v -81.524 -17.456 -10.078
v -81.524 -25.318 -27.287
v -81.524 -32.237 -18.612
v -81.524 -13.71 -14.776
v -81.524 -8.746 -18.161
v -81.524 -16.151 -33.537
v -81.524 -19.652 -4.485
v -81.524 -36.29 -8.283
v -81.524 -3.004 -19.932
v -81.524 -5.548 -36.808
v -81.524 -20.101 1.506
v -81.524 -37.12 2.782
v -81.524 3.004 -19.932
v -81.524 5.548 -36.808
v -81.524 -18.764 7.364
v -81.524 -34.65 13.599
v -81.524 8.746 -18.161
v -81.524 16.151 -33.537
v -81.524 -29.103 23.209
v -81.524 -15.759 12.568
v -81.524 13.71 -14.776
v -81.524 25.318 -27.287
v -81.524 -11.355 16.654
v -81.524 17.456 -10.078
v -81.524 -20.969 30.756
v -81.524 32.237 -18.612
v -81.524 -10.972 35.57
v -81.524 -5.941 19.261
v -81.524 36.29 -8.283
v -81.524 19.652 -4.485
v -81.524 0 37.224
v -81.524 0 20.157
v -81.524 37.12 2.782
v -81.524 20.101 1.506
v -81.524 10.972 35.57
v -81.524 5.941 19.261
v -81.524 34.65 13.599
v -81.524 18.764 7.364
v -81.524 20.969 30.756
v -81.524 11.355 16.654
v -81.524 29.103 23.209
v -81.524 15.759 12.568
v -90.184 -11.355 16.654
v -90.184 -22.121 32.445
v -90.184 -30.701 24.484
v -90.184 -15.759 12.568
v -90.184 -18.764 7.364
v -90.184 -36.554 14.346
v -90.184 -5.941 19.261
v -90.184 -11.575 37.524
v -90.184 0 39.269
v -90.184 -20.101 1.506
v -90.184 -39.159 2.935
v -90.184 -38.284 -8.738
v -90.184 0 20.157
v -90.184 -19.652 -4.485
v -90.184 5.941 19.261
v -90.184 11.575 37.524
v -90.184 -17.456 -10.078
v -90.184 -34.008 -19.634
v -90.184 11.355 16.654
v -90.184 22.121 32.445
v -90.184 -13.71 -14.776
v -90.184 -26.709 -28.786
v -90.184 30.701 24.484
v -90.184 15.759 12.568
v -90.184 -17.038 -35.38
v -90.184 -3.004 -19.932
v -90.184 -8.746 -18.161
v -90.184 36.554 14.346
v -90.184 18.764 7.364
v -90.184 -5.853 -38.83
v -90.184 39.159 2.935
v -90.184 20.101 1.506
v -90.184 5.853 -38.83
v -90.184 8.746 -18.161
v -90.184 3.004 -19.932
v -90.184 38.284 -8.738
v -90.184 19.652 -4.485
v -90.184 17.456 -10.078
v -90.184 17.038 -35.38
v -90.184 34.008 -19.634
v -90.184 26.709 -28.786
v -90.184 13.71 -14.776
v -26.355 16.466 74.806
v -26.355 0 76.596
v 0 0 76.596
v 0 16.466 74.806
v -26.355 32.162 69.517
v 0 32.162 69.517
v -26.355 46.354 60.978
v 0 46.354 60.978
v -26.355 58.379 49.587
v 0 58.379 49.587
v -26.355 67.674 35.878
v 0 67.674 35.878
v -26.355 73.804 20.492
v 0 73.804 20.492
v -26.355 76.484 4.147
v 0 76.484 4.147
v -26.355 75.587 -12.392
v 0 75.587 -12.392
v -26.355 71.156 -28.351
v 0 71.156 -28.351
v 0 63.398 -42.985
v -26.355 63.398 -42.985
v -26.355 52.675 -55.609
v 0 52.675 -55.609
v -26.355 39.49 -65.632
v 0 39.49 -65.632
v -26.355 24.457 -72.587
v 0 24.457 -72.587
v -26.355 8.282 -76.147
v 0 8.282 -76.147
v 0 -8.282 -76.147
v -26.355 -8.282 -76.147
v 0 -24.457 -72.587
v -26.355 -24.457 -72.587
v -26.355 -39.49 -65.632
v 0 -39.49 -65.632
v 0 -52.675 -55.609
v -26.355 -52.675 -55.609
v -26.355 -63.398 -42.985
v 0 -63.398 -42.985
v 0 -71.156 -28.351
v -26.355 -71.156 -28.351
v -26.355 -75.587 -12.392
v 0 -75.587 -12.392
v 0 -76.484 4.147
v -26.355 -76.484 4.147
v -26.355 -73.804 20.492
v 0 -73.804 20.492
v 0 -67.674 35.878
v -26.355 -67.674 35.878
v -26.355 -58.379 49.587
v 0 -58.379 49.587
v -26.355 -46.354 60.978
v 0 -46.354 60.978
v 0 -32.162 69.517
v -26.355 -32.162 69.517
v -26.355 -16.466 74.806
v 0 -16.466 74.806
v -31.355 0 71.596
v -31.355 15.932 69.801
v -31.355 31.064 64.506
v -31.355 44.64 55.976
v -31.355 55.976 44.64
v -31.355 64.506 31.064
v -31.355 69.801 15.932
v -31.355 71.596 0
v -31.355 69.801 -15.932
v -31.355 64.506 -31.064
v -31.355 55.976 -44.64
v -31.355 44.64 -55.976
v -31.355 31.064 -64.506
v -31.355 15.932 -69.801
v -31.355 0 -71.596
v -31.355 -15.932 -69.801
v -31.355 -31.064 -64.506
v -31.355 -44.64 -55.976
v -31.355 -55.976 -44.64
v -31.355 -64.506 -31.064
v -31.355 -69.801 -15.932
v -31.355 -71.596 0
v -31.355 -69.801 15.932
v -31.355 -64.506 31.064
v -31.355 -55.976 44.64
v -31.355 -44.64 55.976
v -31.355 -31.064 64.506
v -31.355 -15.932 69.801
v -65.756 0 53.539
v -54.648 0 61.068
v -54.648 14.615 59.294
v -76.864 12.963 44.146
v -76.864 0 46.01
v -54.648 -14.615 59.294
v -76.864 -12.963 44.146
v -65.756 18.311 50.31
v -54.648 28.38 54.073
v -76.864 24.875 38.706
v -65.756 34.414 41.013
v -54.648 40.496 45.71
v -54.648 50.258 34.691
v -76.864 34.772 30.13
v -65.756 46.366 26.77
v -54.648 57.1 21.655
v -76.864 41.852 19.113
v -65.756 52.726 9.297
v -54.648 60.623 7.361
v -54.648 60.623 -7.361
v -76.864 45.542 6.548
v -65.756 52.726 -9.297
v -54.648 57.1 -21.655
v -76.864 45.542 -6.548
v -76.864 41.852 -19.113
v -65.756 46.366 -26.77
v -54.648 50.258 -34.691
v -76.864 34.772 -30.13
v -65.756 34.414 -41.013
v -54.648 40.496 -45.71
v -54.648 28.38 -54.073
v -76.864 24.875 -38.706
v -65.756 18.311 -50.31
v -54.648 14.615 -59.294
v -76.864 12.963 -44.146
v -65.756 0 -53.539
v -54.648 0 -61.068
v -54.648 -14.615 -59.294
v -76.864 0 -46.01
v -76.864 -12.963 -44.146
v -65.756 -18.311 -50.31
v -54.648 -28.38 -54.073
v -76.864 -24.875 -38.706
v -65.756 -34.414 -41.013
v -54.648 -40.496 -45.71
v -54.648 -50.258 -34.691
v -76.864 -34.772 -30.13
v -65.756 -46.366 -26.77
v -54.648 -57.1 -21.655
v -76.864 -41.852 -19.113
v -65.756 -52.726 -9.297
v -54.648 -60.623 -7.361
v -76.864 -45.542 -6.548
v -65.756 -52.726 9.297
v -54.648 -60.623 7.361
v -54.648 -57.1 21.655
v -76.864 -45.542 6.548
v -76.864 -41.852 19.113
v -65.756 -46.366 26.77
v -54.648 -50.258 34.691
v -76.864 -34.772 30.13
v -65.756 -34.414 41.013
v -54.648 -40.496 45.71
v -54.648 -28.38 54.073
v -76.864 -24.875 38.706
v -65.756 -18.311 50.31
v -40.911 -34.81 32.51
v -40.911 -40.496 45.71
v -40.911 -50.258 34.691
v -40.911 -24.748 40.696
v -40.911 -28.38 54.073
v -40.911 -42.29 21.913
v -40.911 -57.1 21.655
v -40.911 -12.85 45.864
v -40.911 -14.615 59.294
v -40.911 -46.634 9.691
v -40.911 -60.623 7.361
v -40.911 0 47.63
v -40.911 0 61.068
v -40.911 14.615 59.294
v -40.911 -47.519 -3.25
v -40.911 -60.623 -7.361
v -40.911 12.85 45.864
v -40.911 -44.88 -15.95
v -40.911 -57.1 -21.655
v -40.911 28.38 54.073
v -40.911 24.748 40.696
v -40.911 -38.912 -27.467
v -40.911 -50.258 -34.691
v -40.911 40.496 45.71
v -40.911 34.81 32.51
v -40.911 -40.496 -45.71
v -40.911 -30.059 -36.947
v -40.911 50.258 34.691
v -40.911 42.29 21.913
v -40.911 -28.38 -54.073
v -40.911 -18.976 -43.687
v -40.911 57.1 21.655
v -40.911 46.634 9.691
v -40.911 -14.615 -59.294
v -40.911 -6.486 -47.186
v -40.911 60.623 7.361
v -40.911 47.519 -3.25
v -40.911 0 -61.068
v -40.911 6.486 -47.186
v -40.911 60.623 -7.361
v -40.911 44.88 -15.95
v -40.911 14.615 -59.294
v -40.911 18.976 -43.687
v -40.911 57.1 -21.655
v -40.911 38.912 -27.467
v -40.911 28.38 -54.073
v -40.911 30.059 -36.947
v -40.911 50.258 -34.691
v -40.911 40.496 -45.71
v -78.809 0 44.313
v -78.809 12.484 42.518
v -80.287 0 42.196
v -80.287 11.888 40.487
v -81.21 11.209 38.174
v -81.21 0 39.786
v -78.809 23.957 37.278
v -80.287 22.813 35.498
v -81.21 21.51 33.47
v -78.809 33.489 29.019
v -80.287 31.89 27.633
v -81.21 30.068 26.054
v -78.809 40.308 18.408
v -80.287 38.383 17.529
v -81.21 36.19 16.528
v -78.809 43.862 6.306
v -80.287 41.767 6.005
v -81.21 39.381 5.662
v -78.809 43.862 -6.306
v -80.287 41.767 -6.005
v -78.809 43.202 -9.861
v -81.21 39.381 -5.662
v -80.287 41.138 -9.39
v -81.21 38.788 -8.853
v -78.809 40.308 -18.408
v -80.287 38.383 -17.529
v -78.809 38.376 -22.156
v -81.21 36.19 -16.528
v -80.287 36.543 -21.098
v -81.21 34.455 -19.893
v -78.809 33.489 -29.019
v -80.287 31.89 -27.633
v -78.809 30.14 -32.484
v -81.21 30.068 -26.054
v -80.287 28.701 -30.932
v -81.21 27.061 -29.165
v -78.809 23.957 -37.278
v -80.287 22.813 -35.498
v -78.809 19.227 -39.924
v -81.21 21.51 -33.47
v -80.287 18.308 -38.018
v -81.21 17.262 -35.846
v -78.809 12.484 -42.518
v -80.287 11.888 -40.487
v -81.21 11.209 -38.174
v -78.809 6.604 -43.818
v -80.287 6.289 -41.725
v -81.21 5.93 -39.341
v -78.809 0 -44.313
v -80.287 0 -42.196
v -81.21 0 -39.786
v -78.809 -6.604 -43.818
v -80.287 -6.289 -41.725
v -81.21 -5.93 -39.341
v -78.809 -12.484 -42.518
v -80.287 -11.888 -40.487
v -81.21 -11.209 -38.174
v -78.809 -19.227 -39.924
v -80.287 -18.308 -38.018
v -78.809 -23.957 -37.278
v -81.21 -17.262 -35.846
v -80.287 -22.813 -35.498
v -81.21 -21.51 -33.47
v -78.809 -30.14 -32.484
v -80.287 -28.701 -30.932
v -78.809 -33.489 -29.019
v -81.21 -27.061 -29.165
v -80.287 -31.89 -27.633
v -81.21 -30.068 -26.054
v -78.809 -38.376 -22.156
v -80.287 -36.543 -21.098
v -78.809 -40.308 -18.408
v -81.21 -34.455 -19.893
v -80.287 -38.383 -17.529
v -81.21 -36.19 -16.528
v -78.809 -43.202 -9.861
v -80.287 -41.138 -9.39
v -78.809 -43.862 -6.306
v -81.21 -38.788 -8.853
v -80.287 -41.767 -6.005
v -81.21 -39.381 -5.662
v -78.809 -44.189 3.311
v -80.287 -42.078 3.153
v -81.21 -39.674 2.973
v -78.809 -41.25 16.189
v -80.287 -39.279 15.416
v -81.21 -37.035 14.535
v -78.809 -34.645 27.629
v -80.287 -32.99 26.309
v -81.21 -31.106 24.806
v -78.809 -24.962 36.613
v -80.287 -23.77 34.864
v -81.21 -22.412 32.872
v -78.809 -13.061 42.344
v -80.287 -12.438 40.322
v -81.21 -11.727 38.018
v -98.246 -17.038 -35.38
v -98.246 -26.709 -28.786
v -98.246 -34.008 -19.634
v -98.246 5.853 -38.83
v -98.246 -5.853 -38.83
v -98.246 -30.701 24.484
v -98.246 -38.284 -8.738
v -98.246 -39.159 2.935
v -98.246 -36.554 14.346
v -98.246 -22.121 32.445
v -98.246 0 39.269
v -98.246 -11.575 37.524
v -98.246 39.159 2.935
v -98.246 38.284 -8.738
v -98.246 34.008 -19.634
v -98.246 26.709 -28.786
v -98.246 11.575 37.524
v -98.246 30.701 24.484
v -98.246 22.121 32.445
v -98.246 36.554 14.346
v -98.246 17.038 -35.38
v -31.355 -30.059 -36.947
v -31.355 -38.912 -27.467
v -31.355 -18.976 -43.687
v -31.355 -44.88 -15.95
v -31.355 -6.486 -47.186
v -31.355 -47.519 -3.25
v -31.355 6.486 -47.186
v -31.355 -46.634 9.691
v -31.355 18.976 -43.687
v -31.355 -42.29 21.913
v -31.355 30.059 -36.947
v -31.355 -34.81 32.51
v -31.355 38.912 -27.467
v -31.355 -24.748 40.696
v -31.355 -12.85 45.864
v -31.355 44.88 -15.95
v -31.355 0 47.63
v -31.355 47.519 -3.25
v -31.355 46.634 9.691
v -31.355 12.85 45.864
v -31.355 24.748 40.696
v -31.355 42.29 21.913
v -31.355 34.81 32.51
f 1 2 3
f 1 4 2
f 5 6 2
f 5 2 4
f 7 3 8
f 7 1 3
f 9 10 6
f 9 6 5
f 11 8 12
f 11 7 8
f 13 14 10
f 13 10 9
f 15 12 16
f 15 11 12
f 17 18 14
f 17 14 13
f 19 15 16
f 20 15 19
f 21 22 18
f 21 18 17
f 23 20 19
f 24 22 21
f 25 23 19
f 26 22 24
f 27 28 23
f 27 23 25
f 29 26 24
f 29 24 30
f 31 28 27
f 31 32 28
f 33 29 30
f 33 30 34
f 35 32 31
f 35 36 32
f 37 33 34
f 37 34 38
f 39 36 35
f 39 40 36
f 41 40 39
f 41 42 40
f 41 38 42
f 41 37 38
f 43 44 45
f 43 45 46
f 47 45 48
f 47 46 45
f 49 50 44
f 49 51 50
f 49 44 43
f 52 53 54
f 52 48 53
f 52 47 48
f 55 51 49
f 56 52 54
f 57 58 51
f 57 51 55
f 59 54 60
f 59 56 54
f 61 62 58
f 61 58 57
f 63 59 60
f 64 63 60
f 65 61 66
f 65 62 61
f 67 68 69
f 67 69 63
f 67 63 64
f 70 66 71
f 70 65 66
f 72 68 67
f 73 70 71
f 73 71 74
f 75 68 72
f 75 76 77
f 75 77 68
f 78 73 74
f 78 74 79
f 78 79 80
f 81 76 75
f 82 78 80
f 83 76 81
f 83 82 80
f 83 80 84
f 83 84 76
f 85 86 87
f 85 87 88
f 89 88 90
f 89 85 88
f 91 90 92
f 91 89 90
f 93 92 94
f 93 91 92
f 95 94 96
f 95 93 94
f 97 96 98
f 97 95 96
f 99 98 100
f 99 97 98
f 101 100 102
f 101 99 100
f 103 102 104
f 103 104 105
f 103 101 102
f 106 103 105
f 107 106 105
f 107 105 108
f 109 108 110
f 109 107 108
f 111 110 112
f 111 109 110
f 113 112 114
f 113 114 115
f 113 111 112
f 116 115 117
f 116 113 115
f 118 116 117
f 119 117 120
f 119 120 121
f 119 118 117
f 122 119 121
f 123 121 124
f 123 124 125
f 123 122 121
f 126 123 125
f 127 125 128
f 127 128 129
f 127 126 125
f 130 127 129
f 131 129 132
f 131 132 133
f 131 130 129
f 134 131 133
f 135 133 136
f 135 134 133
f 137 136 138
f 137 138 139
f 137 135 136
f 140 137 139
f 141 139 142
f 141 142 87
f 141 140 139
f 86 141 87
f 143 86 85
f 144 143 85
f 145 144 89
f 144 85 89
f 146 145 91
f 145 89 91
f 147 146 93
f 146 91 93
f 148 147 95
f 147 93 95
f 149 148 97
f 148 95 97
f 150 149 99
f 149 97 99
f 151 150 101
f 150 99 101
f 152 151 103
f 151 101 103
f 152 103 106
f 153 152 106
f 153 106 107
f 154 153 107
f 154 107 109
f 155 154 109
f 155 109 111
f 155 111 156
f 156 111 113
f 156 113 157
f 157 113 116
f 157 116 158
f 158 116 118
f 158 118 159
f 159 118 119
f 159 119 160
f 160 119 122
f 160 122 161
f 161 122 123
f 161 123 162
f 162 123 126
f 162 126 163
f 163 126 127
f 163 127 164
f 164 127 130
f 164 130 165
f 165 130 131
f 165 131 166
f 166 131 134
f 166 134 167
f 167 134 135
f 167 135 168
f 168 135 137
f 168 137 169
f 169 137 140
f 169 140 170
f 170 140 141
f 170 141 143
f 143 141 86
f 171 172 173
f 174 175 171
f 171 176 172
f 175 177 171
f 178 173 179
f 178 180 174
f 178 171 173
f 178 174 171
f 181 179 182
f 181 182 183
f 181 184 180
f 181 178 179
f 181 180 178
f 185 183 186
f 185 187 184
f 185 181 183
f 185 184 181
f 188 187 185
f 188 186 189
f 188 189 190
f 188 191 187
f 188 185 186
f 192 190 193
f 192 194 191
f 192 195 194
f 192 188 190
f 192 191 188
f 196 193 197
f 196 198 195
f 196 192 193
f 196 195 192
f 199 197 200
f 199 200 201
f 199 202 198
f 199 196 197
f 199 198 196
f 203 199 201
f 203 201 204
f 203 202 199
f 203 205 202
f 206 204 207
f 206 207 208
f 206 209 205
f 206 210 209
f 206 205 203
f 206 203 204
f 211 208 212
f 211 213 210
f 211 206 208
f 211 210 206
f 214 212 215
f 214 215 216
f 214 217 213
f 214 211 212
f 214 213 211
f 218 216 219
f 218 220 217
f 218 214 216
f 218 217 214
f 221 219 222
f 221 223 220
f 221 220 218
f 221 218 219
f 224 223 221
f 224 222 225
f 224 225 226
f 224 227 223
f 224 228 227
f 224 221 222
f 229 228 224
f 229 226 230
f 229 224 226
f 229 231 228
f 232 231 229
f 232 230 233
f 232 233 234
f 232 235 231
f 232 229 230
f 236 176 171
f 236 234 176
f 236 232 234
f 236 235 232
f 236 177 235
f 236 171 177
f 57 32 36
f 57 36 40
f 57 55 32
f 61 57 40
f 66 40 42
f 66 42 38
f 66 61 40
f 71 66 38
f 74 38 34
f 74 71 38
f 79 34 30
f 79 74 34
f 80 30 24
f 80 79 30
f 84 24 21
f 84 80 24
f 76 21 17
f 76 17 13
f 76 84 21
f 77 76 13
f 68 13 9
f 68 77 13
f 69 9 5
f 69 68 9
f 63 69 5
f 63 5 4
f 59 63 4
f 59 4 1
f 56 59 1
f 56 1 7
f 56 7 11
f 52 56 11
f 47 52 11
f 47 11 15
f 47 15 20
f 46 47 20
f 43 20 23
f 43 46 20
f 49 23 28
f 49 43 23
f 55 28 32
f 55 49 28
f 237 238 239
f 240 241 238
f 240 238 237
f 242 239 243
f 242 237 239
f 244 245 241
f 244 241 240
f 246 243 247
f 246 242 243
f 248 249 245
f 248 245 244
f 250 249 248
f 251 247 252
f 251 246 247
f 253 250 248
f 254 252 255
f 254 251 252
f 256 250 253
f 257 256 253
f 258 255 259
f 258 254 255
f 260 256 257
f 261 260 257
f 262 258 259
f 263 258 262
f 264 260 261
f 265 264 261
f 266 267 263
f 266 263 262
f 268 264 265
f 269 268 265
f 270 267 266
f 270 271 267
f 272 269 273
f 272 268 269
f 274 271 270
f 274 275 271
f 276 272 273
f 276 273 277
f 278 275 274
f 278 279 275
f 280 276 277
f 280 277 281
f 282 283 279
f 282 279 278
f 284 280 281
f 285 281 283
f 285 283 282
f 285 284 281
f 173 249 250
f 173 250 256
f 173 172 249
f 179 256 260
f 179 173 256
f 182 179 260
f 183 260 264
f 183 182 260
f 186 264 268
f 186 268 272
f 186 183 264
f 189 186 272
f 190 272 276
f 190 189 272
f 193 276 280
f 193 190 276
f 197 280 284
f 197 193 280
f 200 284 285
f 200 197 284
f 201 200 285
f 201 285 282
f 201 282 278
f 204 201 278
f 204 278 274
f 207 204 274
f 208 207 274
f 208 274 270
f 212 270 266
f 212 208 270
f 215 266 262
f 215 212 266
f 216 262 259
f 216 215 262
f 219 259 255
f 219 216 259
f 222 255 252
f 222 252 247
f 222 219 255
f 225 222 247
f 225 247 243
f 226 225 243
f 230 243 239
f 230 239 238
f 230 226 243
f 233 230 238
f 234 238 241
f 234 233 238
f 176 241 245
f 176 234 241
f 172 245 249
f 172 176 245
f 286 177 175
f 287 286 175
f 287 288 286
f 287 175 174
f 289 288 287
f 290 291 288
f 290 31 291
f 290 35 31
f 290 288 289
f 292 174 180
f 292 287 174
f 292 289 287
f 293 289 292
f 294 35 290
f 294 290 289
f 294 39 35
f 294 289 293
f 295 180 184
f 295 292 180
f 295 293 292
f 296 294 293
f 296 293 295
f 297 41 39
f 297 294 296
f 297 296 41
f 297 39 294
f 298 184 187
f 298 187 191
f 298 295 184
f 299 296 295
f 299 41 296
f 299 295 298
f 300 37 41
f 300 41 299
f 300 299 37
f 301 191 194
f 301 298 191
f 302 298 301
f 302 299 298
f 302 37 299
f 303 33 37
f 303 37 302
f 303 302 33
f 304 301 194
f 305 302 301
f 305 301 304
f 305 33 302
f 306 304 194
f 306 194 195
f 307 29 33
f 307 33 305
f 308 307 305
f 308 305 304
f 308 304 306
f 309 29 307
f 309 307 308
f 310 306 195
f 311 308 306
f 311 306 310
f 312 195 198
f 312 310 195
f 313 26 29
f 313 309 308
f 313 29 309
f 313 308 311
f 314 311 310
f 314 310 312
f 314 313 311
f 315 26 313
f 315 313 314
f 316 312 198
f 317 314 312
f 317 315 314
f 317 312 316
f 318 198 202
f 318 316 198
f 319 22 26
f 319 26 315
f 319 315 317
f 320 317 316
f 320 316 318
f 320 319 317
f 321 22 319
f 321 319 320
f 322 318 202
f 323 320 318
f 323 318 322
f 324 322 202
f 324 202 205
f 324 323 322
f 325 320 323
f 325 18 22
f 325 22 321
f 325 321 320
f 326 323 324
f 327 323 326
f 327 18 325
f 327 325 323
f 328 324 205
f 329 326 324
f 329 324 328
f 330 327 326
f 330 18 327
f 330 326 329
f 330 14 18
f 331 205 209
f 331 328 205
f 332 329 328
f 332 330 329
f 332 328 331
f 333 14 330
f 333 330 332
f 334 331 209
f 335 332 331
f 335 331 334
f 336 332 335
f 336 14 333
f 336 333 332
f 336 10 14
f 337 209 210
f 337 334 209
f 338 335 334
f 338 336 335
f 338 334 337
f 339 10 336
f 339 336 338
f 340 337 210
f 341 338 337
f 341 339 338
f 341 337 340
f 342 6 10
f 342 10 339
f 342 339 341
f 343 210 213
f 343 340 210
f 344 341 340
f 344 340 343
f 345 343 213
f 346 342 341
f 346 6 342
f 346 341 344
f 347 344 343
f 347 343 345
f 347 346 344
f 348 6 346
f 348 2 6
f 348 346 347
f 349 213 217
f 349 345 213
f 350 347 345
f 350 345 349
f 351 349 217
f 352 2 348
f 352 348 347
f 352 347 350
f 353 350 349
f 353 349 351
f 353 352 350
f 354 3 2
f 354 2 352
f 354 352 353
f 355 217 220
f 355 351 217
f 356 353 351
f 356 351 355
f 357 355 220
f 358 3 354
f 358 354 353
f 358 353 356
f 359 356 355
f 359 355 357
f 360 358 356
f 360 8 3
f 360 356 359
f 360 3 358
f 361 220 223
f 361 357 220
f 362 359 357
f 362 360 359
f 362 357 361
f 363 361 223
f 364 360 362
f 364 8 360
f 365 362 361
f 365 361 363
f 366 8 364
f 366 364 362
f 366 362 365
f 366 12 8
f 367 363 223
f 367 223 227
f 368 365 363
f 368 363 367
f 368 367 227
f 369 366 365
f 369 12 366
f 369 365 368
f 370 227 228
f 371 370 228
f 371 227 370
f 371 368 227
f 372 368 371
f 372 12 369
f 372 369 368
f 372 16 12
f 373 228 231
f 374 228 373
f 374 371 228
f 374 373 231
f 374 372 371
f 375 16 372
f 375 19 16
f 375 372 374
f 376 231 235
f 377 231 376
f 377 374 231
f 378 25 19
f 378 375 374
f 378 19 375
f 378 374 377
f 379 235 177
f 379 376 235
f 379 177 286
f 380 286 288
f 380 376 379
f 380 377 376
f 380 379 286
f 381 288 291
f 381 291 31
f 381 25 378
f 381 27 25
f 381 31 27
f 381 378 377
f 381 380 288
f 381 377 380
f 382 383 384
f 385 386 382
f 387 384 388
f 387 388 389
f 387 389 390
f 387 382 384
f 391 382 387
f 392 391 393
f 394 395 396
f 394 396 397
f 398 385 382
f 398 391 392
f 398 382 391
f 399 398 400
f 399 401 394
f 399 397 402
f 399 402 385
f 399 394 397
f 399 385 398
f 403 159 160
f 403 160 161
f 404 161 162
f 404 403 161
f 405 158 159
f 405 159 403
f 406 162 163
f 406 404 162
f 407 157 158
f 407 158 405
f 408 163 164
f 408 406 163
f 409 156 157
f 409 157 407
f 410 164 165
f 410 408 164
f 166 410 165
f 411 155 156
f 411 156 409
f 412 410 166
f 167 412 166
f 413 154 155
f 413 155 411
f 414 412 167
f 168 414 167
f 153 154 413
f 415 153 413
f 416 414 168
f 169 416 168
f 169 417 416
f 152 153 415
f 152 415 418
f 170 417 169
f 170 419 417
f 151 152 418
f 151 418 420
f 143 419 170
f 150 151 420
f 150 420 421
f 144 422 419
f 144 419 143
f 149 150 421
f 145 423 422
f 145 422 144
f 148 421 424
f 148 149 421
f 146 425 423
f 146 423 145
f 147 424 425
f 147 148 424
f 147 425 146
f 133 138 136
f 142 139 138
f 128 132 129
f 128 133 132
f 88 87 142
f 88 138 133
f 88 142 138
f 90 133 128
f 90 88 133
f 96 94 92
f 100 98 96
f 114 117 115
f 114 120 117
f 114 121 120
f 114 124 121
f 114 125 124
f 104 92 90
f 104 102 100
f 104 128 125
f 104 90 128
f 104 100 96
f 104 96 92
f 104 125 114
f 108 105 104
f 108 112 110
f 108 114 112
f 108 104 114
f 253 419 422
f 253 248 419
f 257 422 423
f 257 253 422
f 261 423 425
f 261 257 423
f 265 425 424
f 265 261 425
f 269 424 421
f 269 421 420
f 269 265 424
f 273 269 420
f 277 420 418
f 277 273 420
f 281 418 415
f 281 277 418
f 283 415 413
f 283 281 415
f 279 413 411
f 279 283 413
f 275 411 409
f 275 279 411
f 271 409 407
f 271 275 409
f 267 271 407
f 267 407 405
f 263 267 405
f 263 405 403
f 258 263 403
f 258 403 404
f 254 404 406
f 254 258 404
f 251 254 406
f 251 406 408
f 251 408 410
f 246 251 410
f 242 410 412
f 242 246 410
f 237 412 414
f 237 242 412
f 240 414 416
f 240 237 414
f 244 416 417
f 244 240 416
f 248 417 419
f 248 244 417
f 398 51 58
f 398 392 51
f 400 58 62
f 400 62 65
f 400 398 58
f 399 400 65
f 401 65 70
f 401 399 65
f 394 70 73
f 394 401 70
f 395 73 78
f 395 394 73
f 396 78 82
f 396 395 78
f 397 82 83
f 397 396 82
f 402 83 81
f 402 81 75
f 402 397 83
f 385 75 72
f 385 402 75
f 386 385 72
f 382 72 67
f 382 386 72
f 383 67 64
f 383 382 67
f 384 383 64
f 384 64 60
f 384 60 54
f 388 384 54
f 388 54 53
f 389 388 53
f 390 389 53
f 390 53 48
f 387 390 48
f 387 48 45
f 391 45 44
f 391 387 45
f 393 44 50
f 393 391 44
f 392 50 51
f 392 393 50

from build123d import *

# Parameters (mm, degrees)
F2_R    = 10.6144552681
F3_SIZE = 5


# Not quite as in the source:
# - a feature of the source that left no trace in its solid (it failed there, or was rolled back) is left out


with BuildPart() as f1:
    # F0 (on Front) → F1 (revolve)
    with BuildSketch(Plane.XZ):
        Polygon((-98.2463732362, 0), (0, 0), (0, 76.5963345766), (-31.3552282751, 76.5963345766), (-31.3552282751, 47.6300790906), (-40.9111082554, 47.6300790906), (-40.9111082554, 61.0680393875), (-54.6476840973, 61.0680393875), (-81.5235897899, 42.8521446884), (-81.5235897899, 20.1569329947), (-90.1836082339, 20.1569329947), (-90.1836082339, 39.2686873674), (-98.2463732362, 39.2686873674), align=None)
    revolve(axis=Axis((-49.1231866181, 0, 0), (-1, 0, 0)))

    # F2
    f2_edges = [f1.edges().sort_by_distance(p)[0] for p in [
        (-81.52359, 0, -42.852145),
    ]]
    fillet(f2_edges, radius=F2_R)

    # F3
    f3_edges = [f1.edges().sort_by_distance(p)[0] for p in [
        (-31.355228, 0, -76.596335),
    ]]
    chamfer(f3_edges, length=F3_SIZE)


solid = f1.part
